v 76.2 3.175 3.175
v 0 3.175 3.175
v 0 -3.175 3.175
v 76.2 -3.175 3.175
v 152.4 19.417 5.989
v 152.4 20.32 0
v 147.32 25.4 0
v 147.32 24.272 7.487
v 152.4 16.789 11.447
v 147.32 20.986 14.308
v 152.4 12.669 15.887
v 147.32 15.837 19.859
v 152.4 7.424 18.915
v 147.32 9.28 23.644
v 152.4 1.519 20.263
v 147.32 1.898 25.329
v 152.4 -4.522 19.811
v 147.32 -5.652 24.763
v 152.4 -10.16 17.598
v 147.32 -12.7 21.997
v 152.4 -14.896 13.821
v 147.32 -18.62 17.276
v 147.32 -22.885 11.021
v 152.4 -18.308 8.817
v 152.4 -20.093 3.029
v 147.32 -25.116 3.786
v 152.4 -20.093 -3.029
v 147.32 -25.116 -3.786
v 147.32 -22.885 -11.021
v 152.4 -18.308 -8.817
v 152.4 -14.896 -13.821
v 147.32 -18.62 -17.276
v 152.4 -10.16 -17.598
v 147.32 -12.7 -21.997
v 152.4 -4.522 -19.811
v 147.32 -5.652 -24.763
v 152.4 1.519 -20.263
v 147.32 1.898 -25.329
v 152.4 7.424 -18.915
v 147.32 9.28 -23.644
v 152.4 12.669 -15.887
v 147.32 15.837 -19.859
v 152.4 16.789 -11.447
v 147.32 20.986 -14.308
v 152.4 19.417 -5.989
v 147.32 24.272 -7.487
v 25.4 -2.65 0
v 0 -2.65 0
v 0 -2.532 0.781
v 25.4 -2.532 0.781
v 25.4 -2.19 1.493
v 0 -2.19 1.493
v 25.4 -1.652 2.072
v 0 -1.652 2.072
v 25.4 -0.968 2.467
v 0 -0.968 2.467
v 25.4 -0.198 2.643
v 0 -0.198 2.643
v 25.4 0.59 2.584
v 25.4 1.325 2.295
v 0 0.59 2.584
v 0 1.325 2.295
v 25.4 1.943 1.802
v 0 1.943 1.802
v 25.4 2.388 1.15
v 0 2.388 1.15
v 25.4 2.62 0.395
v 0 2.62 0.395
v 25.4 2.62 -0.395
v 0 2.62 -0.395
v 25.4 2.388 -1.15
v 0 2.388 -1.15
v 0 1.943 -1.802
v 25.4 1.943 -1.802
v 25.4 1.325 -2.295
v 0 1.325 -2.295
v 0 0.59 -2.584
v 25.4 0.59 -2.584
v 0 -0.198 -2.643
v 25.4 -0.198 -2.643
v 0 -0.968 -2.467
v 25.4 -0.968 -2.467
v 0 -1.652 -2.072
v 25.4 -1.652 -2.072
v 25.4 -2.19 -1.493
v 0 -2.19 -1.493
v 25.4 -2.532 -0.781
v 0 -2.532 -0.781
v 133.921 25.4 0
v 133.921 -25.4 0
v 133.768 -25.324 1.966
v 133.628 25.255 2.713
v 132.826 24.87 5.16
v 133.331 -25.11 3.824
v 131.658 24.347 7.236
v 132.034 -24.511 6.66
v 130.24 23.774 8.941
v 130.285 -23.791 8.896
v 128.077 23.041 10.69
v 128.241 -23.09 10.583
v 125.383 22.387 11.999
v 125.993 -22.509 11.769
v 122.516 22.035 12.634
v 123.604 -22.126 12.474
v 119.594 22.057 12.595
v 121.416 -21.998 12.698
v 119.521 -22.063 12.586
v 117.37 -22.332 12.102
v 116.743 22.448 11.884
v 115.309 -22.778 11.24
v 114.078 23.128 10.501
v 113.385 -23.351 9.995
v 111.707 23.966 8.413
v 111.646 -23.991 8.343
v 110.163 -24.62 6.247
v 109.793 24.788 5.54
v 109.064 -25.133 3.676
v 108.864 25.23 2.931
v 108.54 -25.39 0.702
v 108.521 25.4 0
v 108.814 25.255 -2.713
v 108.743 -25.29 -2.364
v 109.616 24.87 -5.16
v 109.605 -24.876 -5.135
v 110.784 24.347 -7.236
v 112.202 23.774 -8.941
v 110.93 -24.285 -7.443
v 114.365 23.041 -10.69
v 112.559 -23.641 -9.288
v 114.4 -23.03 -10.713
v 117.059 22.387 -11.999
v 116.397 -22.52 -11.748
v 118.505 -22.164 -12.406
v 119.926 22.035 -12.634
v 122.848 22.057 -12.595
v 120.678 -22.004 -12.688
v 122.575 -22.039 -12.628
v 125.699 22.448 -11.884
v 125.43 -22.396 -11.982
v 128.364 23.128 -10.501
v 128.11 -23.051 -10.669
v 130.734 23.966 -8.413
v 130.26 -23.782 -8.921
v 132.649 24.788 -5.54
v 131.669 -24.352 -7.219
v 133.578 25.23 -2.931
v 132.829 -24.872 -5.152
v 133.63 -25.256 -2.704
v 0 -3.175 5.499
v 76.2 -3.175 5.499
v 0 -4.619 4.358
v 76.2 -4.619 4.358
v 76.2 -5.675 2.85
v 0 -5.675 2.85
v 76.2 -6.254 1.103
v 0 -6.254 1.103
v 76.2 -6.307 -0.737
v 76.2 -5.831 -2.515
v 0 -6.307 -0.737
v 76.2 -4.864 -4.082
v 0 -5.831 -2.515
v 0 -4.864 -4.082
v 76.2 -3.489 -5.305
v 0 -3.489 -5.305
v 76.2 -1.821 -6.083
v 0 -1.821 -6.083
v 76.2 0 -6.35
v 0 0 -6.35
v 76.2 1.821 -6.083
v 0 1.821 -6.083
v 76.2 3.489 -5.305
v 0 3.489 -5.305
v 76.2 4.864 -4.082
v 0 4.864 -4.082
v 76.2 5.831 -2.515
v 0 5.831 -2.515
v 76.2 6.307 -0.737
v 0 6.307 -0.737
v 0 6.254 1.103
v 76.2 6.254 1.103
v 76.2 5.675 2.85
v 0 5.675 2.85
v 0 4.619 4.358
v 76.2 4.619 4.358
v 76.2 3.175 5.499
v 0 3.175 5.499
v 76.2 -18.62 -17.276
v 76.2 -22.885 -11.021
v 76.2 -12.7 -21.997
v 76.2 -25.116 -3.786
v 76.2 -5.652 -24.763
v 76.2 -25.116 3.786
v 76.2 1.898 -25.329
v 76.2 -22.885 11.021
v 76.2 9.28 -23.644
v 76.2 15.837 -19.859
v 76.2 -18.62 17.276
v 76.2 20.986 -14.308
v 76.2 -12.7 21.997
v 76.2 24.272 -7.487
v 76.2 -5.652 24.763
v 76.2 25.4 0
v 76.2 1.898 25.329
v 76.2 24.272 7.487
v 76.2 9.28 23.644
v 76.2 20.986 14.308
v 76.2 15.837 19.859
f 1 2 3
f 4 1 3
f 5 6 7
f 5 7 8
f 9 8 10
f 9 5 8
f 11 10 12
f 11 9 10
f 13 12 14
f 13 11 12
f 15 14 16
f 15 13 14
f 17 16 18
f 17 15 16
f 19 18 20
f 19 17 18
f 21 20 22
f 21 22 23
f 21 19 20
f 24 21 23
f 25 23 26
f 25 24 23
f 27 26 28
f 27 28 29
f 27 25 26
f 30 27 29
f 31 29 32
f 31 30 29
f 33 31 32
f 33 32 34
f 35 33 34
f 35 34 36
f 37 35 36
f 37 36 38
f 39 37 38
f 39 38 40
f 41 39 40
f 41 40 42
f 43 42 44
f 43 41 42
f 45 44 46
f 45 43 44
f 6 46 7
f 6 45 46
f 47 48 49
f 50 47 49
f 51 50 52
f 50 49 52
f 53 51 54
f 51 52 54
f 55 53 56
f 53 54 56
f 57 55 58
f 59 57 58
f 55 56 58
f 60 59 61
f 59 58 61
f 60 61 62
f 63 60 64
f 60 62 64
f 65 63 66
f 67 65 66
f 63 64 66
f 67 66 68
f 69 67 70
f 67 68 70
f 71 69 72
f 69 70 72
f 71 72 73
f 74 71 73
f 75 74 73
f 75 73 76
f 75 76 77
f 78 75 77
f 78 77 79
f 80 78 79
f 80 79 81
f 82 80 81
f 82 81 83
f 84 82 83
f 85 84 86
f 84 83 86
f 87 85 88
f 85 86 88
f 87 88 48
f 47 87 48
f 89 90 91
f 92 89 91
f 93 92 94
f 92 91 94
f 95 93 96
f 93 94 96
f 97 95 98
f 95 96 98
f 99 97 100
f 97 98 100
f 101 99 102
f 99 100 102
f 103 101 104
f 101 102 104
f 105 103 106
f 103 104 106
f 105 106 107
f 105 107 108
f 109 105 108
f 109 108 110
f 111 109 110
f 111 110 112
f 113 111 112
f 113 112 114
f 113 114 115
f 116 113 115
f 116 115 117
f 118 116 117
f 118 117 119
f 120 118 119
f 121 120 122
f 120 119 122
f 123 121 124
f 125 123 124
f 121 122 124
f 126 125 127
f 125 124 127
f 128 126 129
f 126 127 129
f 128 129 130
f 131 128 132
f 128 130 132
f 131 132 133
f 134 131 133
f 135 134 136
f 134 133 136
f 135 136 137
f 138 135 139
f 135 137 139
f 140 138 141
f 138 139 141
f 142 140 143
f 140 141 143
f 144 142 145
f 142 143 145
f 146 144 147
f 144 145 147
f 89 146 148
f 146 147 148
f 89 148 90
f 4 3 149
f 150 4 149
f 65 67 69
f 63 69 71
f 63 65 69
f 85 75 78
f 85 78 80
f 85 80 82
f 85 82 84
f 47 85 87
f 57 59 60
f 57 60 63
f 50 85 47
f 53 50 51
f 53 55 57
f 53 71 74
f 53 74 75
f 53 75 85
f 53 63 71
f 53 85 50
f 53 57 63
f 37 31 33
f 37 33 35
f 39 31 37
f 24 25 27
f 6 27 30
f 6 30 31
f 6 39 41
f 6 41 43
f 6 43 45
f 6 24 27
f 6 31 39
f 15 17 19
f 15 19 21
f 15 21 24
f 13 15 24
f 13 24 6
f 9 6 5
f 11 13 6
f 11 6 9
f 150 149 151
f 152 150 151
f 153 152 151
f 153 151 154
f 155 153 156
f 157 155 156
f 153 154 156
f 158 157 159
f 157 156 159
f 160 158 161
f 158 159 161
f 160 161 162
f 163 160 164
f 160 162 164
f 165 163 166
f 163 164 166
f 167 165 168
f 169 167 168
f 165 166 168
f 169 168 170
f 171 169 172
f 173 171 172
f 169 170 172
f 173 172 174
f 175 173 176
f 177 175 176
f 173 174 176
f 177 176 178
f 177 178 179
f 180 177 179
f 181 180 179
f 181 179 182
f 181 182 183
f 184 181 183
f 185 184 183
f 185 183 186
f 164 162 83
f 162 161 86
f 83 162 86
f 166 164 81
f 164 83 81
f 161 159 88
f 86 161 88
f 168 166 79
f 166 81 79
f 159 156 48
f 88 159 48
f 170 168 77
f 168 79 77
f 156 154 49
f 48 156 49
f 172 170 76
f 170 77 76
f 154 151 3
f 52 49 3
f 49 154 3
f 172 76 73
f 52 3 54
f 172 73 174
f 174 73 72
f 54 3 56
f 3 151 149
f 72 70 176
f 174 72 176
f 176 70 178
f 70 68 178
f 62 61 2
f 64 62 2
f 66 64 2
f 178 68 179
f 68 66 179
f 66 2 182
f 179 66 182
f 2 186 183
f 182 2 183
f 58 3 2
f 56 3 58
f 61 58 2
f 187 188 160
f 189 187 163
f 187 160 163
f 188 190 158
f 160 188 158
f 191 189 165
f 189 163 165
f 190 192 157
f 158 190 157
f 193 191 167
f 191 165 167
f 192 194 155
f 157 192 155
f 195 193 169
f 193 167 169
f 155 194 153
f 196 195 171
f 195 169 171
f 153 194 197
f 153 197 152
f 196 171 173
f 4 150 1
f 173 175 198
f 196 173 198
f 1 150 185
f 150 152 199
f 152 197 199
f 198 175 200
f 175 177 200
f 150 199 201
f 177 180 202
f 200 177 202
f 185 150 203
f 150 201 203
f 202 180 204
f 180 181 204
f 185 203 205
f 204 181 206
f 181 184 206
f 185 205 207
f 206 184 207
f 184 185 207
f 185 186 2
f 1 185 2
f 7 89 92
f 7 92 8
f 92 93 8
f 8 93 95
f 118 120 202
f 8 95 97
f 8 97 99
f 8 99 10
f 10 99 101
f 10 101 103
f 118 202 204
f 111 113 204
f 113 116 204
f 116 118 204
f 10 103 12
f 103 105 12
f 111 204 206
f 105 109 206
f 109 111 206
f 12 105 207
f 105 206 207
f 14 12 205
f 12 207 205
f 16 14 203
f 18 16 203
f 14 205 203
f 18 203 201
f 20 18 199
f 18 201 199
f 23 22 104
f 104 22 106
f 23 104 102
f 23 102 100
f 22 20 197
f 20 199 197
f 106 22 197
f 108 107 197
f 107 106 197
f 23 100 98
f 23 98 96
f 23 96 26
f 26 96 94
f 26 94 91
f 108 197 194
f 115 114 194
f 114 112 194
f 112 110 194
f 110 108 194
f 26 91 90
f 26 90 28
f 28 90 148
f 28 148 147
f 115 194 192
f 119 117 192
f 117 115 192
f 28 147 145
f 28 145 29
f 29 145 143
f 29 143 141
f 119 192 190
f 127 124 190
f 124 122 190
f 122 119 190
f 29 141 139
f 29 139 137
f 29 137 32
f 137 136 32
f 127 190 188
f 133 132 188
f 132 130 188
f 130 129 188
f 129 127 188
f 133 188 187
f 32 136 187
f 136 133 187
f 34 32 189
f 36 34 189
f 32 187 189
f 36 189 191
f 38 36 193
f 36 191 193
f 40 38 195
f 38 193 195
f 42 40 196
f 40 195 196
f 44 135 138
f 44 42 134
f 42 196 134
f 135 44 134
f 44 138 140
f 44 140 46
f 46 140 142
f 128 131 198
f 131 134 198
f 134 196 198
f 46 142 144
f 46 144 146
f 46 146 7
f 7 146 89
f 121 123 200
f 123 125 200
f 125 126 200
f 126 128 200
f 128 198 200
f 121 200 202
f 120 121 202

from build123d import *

# Parameters (mm, degrees)
F1_DEPTH = 76.2
F2_R     = 25.4
F3_DEPTH = 76.2
F4_R     = 2.65
F5_DEPTH = 25.4
F6_R     = 12.7
F7_DEPTH = 25.4
F8_SIZE  = 5.08


with BuildPart() as f1:
    # F0 (on Right) → F1 (new body)
    with BuildSketch(Plane.YZ):
        with BuildLine():
            Line((-3.175, 3.175), (-3.175, 5.499261314))
            ThreePointArc((-3.175, 5.499261314), (0, -6.35), (3.175, 5.499261314))
            Line((3.175, 5.499261314), (3.175, 3.175))
            Line((3.175, 3.175), (-3.175, 3.175))
        make_face()
    extrude(amount=F1_DEPTH)

    # F2 (on face) → F3 (join)
    with BuildSketch(Plane.YZ.offset(76.2)):
        Circle(F2_R)
    extrude(amount=F3_DEPTH)

    # F4 (on face) → F5 (cut)
    with BuildSketch(Plane(origin=(0, 0, 0), x_dir=(0, -1, 0), z_dir=(-1, 0, 0))):
        Circle(F4_R)
    extrude(amount=-F5_DEPTH, mode=Mode.SUBTRACT)

    # F6 (on Front) → F7 (cut, symmetric)
    with BuildSketch(Plane.XZ):
        with Locations((121.220822216, 0)):
            Circle(F6_R)
    extrude(amount=F7_DEPTH, both=True, mode=Mode.SUBTRACT)

    # F8
    f8_edges = [f1.edges().sort_by_distance(p)[0] for p in [
        (152.4, -25.4, 0),
    ]]
    chamfer(f8_edges, length=F8_SIZE)


solid = f1.part
